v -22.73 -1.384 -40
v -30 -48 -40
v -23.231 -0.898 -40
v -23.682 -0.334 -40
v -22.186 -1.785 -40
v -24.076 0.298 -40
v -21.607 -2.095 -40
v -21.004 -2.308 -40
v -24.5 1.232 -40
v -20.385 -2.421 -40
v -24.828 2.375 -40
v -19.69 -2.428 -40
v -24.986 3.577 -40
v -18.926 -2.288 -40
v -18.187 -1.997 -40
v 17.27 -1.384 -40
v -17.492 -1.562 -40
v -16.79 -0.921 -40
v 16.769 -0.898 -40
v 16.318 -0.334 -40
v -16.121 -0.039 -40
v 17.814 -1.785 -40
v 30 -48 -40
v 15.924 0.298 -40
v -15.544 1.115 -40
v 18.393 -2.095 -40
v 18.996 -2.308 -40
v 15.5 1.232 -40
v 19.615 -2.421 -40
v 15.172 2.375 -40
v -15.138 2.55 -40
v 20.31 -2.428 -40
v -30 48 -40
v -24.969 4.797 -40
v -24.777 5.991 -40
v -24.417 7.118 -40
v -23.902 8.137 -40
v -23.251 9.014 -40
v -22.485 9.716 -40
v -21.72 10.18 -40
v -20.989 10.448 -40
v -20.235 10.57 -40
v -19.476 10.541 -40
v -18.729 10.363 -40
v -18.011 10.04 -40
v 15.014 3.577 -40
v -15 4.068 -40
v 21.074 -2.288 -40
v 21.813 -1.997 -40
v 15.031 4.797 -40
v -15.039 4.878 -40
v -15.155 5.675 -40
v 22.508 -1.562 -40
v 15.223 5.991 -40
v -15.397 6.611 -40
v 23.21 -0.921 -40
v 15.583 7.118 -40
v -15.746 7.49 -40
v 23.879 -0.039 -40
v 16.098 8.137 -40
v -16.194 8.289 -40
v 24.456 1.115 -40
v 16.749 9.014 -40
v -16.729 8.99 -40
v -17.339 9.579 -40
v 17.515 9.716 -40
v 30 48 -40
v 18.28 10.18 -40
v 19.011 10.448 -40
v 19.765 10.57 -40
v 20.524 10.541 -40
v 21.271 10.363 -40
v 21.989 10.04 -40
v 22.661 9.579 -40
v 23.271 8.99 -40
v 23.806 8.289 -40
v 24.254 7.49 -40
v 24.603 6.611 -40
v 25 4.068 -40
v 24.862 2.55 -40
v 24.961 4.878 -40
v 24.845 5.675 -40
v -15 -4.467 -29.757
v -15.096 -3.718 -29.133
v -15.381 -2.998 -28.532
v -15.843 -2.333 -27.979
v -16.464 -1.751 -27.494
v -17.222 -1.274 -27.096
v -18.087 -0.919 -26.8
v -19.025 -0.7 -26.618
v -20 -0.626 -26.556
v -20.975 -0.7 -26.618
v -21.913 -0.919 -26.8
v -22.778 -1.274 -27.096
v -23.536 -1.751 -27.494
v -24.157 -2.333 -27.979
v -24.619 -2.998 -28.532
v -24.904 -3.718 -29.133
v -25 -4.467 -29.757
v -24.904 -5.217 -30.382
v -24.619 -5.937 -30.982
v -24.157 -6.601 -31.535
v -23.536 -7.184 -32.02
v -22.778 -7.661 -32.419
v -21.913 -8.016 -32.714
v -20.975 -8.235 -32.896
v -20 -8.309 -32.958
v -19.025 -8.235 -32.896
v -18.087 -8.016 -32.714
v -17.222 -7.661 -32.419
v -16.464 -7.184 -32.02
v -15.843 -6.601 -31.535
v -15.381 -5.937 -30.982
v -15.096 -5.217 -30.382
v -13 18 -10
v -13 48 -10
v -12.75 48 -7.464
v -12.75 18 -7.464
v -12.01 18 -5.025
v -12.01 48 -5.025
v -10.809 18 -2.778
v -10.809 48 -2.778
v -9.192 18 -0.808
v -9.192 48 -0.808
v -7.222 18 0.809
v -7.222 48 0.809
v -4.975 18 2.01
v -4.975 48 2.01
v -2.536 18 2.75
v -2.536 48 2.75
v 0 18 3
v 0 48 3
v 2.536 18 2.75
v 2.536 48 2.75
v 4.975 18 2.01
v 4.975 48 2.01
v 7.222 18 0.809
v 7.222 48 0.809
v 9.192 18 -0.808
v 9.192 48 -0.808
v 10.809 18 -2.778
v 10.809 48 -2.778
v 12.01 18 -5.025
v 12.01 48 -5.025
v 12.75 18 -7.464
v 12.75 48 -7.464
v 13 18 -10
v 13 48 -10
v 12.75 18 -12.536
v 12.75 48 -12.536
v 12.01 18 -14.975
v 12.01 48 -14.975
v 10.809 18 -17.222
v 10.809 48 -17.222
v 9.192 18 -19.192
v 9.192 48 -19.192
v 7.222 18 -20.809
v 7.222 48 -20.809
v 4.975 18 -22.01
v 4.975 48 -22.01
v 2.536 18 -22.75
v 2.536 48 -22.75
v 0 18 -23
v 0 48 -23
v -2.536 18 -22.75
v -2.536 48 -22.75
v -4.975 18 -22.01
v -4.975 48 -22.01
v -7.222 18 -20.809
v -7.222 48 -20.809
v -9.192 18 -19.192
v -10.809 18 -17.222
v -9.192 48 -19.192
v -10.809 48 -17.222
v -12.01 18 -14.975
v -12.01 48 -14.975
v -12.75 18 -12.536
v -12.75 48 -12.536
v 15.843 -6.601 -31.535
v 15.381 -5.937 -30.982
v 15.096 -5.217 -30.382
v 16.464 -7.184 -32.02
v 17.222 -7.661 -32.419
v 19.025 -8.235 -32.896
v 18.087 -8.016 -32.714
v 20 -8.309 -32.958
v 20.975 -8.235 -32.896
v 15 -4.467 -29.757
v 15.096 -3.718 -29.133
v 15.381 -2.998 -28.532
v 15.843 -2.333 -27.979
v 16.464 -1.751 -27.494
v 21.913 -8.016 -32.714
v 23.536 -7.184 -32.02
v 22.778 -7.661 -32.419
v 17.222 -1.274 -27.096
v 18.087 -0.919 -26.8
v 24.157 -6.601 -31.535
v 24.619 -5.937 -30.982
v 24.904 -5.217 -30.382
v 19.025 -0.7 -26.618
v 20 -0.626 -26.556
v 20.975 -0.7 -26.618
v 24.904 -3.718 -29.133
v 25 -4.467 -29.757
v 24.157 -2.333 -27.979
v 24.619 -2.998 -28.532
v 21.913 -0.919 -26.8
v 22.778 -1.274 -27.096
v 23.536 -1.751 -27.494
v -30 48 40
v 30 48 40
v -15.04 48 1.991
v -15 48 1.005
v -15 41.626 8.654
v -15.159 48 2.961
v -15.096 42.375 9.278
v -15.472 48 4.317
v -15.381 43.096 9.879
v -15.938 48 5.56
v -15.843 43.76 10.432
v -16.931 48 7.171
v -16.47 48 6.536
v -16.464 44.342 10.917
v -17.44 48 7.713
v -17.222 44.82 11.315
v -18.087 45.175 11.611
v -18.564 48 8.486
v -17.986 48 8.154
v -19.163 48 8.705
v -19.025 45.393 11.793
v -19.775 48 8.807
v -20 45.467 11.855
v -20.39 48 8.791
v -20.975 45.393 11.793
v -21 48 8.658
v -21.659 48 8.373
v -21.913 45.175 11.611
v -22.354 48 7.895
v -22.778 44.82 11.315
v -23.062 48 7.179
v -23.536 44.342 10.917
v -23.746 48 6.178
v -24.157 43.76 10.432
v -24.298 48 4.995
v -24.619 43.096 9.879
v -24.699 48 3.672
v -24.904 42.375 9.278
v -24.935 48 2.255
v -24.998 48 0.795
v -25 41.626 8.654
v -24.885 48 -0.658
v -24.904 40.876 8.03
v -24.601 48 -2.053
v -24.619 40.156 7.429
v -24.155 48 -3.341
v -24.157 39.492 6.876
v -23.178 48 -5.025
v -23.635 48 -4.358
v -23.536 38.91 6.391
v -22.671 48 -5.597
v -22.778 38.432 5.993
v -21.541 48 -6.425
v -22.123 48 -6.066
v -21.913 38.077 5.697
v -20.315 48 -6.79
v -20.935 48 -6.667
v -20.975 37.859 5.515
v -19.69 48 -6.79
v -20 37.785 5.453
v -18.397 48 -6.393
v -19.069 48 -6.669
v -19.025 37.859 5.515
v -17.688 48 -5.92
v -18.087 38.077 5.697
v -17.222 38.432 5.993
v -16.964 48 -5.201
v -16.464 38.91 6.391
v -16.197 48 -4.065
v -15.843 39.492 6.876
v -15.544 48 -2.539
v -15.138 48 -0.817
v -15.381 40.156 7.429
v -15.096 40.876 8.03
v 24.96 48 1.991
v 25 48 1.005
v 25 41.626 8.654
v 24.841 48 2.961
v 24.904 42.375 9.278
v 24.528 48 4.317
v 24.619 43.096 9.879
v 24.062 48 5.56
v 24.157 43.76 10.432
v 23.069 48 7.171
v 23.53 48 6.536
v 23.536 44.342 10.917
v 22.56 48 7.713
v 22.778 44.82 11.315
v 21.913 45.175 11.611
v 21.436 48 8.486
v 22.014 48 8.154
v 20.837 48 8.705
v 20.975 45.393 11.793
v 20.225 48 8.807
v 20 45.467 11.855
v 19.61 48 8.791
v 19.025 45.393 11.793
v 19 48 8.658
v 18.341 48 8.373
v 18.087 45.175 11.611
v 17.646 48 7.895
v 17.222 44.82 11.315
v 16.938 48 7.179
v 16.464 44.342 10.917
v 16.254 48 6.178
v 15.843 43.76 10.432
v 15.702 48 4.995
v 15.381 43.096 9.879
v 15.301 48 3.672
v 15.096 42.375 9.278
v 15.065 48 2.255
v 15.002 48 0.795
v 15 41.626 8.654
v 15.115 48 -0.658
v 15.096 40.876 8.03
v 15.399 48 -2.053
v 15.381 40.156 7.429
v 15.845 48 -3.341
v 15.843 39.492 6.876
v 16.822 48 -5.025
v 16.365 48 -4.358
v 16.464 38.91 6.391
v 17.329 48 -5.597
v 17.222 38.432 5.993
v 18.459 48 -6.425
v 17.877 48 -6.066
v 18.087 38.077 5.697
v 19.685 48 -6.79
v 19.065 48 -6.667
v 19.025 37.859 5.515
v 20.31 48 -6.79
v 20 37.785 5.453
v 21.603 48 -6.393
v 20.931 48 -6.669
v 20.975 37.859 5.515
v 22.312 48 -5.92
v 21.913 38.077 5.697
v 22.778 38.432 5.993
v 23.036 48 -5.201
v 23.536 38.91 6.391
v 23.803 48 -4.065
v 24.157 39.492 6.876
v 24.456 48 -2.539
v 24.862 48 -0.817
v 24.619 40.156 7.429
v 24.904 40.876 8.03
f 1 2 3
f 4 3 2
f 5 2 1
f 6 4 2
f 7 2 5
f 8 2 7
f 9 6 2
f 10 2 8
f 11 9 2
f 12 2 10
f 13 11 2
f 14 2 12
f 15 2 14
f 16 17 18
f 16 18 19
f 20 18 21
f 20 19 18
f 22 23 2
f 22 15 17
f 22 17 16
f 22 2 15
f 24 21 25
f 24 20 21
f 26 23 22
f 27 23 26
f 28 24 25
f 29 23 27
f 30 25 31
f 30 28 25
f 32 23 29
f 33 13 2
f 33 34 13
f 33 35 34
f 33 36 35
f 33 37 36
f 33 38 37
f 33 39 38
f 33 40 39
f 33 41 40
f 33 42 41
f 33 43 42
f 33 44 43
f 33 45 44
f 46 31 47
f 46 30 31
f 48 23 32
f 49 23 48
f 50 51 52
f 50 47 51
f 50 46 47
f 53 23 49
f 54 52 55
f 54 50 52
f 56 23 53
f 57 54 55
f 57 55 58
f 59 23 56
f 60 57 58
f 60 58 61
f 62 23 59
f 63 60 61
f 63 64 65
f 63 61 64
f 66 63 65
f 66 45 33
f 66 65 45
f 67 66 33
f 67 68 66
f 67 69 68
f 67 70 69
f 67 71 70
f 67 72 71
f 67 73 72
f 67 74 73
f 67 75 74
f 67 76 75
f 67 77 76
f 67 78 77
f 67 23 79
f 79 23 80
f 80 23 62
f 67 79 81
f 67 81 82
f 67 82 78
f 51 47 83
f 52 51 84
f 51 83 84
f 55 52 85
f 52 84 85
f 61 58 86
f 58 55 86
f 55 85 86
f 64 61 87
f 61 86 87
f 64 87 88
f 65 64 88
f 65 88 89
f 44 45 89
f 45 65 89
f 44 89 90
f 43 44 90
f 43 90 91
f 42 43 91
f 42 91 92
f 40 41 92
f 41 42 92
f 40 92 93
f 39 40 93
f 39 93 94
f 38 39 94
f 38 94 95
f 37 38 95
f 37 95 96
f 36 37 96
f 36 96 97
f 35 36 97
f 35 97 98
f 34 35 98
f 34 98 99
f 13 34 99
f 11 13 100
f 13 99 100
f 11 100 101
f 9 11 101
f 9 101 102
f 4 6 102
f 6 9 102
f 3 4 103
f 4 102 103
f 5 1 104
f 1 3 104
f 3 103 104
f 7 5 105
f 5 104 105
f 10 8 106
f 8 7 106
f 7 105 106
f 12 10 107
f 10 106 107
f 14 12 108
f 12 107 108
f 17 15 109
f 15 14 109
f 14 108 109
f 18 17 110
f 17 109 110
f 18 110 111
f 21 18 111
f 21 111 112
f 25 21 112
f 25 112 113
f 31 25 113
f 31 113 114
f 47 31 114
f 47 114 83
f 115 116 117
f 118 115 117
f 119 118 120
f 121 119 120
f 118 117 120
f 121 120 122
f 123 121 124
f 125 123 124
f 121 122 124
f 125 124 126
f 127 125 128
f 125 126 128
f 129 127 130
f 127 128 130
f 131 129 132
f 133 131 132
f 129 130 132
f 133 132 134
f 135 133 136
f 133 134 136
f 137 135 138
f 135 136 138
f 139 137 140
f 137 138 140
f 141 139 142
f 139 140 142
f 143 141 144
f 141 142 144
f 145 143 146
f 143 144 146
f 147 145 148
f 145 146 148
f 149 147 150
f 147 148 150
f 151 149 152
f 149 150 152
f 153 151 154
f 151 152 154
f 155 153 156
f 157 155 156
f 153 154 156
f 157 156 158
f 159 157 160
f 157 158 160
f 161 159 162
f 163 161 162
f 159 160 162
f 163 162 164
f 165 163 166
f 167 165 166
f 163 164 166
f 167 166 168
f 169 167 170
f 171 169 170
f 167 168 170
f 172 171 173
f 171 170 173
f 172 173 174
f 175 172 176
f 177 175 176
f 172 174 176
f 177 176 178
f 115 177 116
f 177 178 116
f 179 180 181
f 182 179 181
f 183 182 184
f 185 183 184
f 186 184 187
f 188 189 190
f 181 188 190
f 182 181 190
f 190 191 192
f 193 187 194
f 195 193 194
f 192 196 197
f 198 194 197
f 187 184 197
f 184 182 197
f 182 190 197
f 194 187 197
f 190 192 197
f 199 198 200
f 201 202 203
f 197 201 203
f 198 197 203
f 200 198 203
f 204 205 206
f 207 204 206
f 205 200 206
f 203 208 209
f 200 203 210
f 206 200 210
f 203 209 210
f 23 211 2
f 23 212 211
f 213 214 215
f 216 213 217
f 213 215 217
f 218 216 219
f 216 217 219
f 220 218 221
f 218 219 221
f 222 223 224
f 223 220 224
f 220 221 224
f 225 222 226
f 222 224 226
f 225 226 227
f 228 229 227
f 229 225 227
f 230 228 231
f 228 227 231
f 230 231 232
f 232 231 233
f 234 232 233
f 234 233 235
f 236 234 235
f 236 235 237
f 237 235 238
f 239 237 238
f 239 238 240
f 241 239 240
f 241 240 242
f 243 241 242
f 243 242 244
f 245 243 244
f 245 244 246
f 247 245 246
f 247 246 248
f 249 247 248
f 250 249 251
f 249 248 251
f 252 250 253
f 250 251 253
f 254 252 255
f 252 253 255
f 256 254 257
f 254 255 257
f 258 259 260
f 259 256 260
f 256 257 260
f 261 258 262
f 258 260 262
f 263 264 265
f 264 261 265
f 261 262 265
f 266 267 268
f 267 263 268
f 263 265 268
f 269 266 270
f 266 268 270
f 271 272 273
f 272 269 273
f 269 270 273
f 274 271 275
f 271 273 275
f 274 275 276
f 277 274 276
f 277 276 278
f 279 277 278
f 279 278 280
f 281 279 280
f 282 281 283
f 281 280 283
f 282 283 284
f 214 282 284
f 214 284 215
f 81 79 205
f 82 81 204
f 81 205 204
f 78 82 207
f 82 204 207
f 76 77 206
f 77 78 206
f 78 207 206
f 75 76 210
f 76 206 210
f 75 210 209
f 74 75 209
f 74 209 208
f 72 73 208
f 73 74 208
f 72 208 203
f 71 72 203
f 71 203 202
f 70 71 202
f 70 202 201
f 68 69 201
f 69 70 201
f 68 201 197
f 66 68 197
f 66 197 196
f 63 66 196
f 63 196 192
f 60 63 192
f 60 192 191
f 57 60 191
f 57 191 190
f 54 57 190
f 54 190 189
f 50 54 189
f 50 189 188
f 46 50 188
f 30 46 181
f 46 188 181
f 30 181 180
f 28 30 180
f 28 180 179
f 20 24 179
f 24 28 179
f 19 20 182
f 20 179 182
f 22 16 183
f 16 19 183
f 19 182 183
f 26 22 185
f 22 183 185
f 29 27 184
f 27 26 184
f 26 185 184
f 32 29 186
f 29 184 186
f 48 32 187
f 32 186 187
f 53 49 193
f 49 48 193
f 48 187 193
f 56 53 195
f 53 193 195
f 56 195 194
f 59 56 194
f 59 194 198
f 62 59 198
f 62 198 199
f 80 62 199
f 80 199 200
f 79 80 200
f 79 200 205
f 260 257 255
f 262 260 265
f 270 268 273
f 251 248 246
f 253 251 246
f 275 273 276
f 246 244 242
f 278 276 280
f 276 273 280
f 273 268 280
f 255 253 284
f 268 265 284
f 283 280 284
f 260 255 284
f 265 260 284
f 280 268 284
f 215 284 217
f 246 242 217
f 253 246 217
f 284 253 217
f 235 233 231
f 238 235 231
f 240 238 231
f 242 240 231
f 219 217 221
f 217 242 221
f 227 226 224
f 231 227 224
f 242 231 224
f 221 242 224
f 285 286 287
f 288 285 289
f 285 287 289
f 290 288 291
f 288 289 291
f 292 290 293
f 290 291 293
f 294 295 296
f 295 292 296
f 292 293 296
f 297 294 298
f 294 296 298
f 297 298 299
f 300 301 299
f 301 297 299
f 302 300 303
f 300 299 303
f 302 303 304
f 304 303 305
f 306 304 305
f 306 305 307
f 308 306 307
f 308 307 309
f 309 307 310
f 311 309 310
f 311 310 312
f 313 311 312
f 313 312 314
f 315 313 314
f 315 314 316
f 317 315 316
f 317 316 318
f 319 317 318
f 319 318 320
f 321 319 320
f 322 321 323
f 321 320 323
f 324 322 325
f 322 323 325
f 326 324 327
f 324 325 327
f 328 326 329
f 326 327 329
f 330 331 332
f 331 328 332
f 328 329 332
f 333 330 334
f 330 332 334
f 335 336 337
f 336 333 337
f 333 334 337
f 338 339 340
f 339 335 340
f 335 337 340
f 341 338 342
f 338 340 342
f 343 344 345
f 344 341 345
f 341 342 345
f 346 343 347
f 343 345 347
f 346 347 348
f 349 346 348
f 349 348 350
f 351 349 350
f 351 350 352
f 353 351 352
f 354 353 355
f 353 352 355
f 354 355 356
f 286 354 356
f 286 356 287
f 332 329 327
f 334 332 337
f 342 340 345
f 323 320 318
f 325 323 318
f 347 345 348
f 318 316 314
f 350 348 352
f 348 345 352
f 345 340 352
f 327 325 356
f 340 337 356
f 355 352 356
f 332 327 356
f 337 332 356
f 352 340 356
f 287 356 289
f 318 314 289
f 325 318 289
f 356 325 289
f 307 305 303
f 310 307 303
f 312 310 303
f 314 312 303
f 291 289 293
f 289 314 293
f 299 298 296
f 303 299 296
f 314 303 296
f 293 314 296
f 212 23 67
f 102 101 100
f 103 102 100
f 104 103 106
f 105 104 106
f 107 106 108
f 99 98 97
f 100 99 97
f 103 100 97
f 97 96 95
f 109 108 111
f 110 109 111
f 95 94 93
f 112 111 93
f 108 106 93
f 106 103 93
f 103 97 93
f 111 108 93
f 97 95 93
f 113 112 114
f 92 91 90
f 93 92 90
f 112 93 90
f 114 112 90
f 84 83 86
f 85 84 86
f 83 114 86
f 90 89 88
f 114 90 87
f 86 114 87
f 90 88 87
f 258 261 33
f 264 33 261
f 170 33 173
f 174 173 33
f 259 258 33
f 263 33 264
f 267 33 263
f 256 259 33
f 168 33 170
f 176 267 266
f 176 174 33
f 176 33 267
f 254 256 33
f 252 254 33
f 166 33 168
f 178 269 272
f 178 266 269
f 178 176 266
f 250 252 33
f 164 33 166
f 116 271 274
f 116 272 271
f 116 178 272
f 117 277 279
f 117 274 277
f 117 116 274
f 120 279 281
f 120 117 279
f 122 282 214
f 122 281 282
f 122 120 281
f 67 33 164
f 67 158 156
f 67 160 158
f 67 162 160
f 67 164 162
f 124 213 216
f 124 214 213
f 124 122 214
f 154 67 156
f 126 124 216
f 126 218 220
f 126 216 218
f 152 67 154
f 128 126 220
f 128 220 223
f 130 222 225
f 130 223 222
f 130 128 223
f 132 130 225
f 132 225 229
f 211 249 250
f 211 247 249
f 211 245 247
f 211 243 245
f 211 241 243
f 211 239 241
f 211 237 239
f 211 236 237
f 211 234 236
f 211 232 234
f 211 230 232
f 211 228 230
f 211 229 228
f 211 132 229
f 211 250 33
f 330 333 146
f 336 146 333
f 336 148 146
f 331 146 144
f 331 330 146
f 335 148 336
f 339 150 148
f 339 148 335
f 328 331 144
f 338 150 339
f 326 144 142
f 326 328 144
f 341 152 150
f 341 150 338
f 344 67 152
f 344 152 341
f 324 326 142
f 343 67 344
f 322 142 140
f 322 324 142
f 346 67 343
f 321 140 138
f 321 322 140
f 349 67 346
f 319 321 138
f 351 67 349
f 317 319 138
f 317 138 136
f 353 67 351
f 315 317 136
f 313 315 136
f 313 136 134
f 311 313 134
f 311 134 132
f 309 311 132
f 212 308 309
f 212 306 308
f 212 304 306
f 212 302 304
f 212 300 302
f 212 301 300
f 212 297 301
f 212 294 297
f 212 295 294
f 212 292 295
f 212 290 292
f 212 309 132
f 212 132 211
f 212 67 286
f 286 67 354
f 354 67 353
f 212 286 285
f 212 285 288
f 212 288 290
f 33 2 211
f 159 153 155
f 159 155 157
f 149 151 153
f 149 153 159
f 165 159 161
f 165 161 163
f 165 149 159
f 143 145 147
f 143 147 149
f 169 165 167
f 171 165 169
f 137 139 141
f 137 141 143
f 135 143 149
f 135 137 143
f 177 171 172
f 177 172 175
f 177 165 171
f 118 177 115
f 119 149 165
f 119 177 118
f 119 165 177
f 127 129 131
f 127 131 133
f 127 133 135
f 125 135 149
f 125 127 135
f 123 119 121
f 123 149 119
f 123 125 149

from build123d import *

# Parameters (mm, degrees)
F1_DEPTH = 30
F2_R     = 13
F3_DEPTH = 30
F5_R     = 5
F6_DEPTH = 25


with BuildPart() as f1:
    # F0 (on Right) → F1 (new body, symmetric)
    with BuildSketch(Plane.YZ):
        Polygon((48, 40), (-48, -40), (48, -40), align=None)
    extrude(amount=F1_DEPTH, both=True)

    # F2 (on face) → F3 (cut)
    with BuildSketch(Plane(origin=(0, 48, 0), x_dir=(-1, 0, 0), z_dir=(0, 1, 0))):
        with Locations((0, -10)):
            Circle(F2_R)
    extrude(amount=-F3_DEPTH, mode=Mode.SUBTRACT)

    # F5 (on offset) → F6 (cut)
    with BuildSketch(Plane(origin=(0, 12.803688, -15.364426), x_dir=(1, 0, 0), z_dir=(0, -0.640184, 0.768221))):
        with Locations((20, -22.481997)):
            Circle(F5_R)
        with Locations((20, 37.518003)):
            Circle(F5_R)
        with Locations((-20, -22.481997)):
            Circle(F5_R)
        with Locations((-20, 37.518003)):
            Circle(F5_R)
    extrude(amount=-F6_DEPTH, mode=Mode.SUBTRACT)


solid = f1.part
